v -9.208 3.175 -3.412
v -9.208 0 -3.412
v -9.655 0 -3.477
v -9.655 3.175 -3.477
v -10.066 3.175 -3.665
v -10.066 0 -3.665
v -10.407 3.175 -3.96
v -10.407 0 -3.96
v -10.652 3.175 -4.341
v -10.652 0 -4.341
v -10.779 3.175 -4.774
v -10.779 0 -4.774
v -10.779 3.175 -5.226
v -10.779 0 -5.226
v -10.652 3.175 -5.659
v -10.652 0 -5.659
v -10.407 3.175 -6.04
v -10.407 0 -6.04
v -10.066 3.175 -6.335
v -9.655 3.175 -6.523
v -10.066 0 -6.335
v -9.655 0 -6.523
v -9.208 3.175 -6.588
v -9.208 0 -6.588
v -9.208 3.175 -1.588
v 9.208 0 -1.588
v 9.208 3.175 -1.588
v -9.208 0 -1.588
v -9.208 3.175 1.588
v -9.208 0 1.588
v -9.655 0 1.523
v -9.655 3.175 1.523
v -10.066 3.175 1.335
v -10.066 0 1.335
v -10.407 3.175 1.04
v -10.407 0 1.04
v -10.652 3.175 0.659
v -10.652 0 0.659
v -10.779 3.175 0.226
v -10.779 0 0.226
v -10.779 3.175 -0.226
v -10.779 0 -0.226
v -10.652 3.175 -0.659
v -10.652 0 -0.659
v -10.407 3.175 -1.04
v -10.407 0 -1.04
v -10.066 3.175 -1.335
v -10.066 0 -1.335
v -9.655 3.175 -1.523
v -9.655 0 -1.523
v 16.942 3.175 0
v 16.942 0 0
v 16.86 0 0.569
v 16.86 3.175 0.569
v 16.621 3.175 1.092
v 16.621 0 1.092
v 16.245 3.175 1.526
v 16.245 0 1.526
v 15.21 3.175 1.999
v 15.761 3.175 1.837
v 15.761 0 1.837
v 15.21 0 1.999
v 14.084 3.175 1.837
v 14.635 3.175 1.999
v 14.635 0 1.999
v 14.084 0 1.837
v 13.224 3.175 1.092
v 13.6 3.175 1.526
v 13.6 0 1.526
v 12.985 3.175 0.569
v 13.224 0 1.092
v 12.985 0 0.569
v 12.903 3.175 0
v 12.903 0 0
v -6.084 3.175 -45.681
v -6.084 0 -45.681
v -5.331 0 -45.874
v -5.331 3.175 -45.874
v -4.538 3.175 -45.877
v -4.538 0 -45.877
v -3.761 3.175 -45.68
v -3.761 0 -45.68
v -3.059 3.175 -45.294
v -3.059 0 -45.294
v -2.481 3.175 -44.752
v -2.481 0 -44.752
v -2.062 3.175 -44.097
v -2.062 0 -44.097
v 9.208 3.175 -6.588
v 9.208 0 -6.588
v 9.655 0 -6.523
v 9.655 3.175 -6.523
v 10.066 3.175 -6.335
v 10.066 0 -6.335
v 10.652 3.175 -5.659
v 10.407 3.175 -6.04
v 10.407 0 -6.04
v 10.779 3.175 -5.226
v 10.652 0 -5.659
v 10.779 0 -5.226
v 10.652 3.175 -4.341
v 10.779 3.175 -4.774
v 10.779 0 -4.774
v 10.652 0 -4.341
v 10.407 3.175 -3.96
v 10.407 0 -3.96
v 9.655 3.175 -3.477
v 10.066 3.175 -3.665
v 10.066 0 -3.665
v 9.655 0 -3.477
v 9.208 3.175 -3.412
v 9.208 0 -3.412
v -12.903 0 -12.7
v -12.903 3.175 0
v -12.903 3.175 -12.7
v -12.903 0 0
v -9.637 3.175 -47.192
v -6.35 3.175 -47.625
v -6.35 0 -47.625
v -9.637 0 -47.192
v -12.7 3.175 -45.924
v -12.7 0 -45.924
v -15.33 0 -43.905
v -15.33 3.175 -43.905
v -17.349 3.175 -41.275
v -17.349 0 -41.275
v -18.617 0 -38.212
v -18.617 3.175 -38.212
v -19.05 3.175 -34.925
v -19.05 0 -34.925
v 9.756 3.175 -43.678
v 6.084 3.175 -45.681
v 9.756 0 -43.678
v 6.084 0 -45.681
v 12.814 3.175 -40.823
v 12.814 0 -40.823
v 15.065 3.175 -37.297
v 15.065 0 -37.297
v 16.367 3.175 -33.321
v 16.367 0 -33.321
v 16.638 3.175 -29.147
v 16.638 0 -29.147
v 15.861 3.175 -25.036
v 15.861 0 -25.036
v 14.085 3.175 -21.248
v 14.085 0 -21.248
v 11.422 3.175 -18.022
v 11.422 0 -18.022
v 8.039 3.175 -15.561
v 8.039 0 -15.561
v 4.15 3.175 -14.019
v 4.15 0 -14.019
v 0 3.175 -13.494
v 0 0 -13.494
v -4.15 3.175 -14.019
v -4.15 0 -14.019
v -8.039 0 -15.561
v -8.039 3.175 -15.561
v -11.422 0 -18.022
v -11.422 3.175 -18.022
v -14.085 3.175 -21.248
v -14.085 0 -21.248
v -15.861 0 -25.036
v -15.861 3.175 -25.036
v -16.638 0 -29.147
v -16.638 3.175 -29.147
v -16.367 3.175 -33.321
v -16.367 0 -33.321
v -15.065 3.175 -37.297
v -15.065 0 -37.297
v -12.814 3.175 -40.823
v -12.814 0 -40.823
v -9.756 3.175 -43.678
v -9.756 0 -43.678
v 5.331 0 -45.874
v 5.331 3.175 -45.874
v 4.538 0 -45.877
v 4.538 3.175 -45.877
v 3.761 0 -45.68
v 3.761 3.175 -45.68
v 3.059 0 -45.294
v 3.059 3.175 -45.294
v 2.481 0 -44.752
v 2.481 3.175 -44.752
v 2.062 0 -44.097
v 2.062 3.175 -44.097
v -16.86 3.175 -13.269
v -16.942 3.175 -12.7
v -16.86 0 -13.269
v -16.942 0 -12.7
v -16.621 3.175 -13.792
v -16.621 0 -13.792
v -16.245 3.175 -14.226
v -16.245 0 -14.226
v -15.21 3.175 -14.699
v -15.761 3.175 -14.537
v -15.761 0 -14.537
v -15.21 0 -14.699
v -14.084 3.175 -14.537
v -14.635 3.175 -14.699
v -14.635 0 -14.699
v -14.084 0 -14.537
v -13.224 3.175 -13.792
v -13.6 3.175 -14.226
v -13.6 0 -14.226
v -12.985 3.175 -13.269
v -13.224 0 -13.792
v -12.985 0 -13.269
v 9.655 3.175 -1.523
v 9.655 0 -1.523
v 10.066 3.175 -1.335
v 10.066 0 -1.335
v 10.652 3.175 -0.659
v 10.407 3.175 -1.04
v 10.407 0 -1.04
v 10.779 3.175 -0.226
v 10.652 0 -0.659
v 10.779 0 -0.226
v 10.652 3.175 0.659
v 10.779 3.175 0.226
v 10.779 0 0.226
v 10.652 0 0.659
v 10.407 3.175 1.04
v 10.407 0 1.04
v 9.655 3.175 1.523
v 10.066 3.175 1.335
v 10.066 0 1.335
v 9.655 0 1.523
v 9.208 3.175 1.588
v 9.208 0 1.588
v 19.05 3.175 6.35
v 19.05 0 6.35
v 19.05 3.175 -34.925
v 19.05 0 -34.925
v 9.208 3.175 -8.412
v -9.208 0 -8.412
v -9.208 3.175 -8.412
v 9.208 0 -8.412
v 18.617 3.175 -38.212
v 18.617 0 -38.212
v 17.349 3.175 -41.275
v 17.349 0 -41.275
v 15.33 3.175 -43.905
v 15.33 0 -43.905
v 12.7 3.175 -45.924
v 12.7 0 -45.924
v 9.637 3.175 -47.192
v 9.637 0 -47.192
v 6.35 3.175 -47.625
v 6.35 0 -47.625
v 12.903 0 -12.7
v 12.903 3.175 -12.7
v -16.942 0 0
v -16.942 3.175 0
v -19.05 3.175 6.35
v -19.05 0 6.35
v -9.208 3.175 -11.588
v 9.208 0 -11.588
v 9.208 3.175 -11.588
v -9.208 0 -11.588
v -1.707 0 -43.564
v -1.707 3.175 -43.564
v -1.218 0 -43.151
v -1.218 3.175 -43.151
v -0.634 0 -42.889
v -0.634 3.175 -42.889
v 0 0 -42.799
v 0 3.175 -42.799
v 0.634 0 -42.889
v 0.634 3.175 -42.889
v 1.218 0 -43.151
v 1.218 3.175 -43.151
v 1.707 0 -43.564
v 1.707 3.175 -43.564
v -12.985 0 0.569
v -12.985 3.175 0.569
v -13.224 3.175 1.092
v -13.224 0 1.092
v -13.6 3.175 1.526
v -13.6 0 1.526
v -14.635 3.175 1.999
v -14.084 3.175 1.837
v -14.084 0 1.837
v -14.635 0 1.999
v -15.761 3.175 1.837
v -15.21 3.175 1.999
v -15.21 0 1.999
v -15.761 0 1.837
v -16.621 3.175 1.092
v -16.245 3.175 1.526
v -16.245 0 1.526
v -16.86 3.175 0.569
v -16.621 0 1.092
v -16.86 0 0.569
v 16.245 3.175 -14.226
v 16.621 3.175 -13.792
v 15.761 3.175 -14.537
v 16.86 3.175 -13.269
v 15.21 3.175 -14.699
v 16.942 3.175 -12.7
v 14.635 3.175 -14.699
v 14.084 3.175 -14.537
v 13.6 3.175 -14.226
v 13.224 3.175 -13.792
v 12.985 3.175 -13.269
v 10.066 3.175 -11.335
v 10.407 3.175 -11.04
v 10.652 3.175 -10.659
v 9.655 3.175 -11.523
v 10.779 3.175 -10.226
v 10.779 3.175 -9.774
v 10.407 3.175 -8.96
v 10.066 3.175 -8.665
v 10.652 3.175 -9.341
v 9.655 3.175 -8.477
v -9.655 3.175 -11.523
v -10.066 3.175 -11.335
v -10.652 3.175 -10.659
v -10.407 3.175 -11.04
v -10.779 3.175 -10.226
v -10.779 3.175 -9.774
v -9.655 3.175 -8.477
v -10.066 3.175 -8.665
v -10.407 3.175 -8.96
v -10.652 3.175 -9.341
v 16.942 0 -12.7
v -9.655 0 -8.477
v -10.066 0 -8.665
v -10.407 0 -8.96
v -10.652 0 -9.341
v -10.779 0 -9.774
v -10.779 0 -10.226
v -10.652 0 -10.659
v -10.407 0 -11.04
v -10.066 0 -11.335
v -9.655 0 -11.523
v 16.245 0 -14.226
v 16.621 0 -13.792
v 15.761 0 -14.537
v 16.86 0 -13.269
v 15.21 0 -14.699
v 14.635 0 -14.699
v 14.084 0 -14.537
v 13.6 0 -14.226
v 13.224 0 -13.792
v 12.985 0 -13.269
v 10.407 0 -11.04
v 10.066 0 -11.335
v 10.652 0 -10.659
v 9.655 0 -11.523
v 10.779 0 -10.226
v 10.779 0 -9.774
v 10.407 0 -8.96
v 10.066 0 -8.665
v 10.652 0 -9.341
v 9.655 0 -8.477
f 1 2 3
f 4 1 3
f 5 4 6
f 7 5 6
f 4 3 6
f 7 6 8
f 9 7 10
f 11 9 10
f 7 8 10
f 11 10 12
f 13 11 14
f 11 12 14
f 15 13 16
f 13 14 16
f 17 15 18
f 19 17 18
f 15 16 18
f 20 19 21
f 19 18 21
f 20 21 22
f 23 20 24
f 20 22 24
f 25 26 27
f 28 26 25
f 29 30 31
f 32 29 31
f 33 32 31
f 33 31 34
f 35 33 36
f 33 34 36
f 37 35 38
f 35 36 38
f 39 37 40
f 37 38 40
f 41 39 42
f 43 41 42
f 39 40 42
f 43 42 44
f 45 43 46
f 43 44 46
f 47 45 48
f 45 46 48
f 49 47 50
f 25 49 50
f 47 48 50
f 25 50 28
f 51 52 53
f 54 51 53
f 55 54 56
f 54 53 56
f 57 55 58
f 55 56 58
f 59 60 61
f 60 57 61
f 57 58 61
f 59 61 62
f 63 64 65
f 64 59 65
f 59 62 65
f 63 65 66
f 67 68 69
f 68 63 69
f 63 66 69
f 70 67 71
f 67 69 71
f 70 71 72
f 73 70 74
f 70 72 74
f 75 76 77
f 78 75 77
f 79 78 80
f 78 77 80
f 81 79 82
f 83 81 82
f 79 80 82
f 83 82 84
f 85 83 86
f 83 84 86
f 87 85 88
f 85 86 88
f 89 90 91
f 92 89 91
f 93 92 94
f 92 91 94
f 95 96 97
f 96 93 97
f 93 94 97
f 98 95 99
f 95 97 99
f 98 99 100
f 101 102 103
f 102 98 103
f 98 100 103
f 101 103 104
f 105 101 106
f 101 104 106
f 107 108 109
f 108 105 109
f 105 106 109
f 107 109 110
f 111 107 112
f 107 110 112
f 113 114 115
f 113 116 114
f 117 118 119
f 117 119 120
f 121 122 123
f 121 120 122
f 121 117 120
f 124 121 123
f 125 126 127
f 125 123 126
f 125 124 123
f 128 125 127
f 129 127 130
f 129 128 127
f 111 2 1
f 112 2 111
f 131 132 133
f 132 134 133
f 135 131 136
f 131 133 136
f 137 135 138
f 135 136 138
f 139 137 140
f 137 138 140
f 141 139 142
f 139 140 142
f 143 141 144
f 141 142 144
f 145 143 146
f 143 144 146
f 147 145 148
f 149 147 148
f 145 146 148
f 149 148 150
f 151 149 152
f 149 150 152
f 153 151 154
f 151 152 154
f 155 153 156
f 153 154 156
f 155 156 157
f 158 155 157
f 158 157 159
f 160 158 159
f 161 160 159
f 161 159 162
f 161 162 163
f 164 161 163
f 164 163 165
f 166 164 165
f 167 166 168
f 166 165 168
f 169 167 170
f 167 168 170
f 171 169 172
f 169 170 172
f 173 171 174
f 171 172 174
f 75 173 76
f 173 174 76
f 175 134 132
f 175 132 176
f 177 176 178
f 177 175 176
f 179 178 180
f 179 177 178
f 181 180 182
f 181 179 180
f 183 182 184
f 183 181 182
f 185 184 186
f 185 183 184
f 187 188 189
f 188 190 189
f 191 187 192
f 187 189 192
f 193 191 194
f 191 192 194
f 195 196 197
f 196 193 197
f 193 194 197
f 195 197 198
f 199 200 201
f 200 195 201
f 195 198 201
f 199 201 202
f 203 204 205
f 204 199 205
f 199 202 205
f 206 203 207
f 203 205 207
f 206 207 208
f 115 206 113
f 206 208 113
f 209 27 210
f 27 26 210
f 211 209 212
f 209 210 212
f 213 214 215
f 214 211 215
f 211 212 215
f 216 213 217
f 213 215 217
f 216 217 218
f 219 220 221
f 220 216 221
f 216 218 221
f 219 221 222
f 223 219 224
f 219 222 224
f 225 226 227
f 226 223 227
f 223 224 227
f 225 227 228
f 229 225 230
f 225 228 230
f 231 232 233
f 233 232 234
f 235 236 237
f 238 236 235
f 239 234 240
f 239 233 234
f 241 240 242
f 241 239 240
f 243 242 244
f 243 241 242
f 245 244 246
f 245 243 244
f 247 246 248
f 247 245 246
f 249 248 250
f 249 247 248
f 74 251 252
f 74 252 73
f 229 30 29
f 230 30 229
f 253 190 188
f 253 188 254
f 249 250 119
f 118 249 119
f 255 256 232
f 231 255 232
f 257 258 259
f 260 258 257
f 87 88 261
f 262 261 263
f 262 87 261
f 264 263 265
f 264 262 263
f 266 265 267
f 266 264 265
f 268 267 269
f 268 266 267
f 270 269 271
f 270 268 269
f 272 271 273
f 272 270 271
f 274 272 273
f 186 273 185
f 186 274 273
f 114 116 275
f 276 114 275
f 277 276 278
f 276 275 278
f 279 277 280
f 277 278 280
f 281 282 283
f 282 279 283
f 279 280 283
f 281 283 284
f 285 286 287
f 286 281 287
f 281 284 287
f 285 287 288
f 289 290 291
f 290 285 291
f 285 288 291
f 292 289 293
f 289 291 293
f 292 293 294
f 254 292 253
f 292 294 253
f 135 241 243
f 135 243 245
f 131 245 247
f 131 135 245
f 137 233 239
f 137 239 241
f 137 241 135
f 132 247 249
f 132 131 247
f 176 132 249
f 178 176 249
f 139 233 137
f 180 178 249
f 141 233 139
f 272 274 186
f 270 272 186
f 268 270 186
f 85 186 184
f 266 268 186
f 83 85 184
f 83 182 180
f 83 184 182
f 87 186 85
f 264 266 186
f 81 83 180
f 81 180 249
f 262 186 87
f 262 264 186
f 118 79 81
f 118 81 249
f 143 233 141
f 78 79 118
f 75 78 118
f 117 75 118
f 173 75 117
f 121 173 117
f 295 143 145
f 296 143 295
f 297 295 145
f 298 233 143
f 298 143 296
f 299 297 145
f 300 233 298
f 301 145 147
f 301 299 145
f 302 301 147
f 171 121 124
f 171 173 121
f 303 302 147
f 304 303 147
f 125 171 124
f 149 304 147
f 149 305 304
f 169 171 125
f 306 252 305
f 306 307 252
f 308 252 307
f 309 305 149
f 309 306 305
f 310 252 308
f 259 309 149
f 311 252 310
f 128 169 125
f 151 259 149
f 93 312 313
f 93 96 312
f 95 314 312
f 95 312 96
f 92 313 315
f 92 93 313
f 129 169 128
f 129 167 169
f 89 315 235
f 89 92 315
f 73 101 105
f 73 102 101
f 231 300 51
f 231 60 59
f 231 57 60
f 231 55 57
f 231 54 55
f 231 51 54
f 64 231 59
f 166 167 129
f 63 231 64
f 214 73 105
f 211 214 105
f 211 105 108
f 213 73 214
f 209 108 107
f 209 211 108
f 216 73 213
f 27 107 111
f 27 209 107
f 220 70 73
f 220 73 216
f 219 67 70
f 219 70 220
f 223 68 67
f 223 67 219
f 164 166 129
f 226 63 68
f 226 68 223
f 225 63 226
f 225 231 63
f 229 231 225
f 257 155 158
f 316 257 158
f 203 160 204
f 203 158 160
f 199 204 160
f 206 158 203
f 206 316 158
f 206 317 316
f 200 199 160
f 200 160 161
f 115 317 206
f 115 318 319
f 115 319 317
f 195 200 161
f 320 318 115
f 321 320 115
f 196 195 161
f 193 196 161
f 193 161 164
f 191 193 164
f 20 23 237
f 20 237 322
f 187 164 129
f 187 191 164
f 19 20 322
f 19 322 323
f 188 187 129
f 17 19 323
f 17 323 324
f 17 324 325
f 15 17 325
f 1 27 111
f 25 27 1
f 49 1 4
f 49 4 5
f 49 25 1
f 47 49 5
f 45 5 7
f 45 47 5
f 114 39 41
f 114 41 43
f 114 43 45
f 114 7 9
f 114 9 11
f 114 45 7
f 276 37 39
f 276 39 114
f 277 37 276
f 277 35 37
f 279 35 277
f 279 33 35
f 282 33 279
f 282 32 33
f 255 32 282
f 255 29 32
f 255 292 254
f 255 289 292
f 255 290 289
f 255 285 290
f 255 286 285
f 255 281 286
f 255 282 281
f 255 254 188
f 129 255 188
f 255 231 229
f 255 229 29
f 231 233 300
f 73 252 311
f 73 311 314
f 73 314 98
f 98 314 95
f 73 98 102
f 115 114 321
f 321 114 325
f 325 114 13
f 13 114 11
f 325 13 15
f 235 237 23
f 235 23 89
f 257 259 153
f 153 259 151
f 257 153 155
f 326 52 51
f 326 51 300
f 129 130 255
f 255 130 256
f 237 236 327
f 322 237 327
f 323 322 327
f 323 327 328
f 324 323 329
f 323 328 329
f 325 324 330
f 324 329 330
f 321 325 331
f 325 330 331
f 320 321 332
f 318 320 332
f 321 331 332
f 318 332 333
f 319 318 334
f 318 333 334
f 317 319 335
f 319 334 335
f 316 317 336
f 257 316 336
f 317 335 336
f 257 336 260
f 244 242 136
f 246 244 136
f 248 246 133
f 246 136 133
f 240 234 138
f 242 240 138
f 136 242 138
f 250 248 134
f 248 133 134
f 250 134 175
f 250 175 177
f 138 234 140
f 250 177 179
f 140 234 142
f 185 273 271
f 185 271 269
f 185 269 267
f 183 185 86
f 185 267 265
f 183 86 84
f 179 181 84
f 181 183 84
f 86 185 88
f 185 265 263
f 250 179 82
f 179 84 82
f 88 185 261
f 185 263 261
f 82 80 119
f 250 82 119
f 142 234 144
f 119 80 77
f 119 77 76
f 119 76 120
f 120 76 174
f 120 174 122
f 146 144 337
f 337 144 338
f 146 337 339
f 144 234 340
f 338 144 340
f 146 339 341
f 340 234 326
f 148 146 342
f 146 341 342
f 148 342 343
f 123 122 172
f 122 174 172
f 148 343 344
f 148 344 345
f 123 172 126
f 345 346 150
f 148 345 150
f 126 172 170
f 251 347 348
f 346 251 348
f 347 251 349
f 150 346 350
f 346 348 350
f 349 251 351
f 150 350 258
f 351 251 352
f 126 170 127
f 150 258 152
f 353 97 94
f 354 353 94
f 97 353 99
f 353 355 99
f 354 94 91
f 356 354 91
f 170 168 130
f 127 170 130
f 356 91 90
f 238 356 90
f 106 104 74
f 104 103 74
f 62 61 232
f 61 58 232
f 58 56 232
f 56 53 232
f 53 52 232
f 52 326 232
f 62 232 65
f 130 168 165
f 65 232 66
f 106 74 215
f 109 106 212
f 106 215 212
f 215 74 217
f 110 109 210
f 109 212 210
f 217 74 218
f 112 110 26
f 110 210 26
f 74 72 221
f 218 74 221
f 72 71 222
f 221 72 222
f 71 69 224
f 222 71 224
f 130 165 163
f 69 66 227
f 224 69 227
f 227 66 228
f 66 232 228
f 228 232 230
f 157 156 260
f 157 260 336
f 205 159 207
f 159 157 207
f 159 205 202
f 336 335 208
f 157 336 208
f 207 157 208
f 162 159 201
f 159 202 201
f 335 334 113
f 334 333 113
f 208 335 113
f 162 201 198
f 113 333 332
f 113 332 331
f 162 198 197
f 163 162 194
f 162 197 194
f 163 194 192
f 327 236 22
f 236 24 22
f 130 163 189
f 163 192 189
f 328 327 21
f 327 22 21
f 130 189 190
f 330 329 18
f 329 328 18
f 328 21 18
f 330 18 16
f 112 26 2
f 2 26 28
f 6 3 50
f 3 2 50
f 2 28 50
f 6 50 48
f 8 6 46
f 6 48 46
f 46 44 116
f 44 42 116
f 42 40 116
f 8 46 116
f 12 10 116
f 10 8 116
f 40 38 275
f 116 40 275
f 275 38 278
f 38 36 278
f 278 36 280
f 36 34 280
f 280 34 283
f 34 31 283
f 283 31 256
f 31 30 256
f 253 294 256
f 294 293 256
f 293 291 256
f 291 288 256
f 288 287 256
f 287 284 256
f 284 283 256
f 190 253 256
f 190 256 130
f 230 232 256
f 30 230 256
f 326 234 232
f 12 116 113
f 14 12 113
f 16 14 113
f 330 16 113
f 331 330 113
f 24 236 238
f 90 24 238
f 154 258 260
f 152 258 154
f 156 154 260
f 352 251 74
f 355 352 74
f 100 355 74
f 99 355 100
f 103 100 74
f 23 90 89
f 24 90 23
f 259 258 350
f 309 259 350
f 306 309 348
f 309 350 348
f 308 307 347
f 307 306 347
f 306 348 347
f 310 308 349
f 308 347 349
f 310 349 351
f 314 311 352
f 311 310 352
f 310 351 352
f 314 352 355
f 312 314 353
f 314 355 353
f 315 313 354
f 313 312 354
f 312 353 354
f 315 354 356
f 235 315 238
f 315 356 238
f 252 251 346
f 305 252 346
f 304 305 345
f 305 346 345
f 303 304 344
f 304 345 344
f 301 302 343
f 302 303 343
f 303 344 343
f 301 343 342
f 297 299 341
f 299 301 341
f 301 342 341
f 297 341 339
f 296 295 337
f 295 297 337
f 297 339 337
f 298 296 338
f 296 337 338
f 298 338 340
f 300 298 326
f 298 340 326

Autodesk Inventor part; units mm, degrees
ref_plane "XZ Plane" through (0, 0, 0) normal (0, 1, 0) x (-1, 0, 0)
ref_plane "XY Plane" through (0, 0, 0) normal (0, 0, 1) x (1, 0, 0)
sketch "Sketch1" plane through (0, 0, 0) normal (0, 1, 0) x (-1, 0, 0)
  line L0 (-9.2075, -1.5875) -> (9.2075, -1.5875)
  line L1 (9.2075, -1.5875) -> (9.2075, 1.5875)
  line L2 (9.2075, 1.5875) -> (-9.2075, 1.5875)
  line L3 (-9.2075, 1.5875) -> (-9.2075, -1.5875)
  line L4 (-9.2075, -1.5875) -> (9.2075, 1.5875) construction
  line L5 (9.2075, -1.5875) -> (-9.2075, 1.5875) construction
  line L6 (-9.2075, -6.5875) -> (9.2075, -6.5875)
  line L7 (9.2075, -6.5875) -> (9.2075, -3.4125)
  line L8 (9.2075, -3.4125) -> (-9.2075, -3.4125)
  line L9 (-9.2075, -3.4125) -> (-9.2075, -6.5875)
  line L10 (-9.2075, -6.5875) -> (9.2075, -3.4125) construction
  line L11 (9.2075, -6.5875) -> (-9.2075, -3.4125) construction
  line L12 (-9.2075, -11.5875) -> (9.2075, -11.5875)
  line L13 (9.2075, -11.5875) -> (9.2075, -8.4125)
  line L14 (9.2075, -8.4125) -> (-9.2075, -8.4125)
  line L15 (-9.2075, -8.4125) -> (-9.2075, -11.5875)
  line L16 (-9.2075, -11.5875) -> (9.2075, -8.4125) construction
  line L17 (9.2075, -11.5875) -> (-9.2075, -8.4125) construction
  line L18 (19.05, 6.35) -> (-19.05, 6.35)
  line L19 (-19.05, 6.35) -> (-19.05, -47.625)
  line L20 (-19.05, -47.625) -> (19.05, -47.625)
  line L21 (19.05, -47.625) -> (19.05, 6.35)
  circle A0 centre (0, -30.1625) radius 16.6687
  circle A1 centre (9.2075, 0) radius 1.5875
  circle A2 centre (9.2075, -5) radius 1.5875
  circle A3 centre (9.2075, -10) radius 1.5875
  circle A4 centre (-9.2075, -10) radius 1.5875
  circle A5 centre (-9.2075, -5) radius 1.5875
  circle A6 centre (-9.2075, 0) radius 1.5875
  line L22 (14.9225, 0) -> (14.9225, -12.7) construction
  line L23 (12.9032, 0) -> (12.9032, -12.7)
  line L24 (16.9418, -12.7) -> (16.9418, 0)
  arc A7 (16.9418, 0) -> (12.9032, 0) centre (14.9225, 0) ccw
  arc A8 (12.9032, -12.7) -> (16.9418, -12.7) centre (14.9225, -12.7) ccw
  line L25 (-14.9225, 0) -> (-14.9225, -12.7) construction
  line L26 (-16.9418, 0) -> (-16.9418, -12.7)
  line L27 (-12.9032, -12.7) -> (-12.9032, 0)
  arc A9 (-12.9032, 0) -> (-16.9418, 0) centre (-14.9225, 0) ccw
  arc A10 (-16.9418, -12.7) -> (-12.9032, -12.7) centre (-14.9225, -12.7) ccw
  line L28 (10.795, 0) -> (19.05, 0) construction
  line L29 (-10.795, 0) -> (-19.05, 0) construction
  point P0 (0, 0)
  point P1 (0, -5)
  point P2 (0, -10)
  point P3 (0, 6.35)
  point P4 (-9.2075, -11.5875)
  point P5 (9.2075, -8.4125)
  point P6 (-9.2075, -1.5875)
  point P7 (9.2075, 1.5875)
  point P8 (-9.2075, -6.5875)
  point P9 (9.2075, -3.4125)
  point P10 (14.9225, -6.35)
  point P11 (-14.9225, -6.35)
  point P12 (14.9225, 0)
  point P13 (-14.9225, 0)
  dimension "d0" = 18.415
  dimension "d1" = 3.175
  dimension "d6" = 5
  dimension "d7" = 5
  dimension "d8" = 38.1
  dimension "d9" = 53.975
  dimension "d10" = 6.35
  dimension "d11" = 33.3375
  dimension "d20" = 17.4625
  dimension "d21" = 4.0386
  dimension "d22" = 4.0386
  dimension "d23" = 12.7
  dimension "d26" = 12.7
extrude "Extrusion1" add sketch "Sketch1" along normal blind 3.175
sketch "Sketch2" plane through (0, 3.175, 0) normal (0, 1, 0) x (1, 0, 0)
  circle A0 centre (0, 45.085) radius 2.286
  line L0 (19.05, 47.625) -> (-19.05, 47.625) projected
  point P0 (0, 0)
  point P1 (0, 47.625)
  dimension "d14" = 4.572
  dimension "d15" = 2.54
extrude "Extrusion2" add sketch "Sketch2" against normal blind 3.175
fillet "Fillet1" radius 3.175 2 edges at (-1.5575, 1.5875, -46.7583) (1.5575, 1.5875, -46.7583)
fillet "Fillet2" radius 12.7 2 edges at (-19.05, 1.5875, -47.625) (19.05, 1.5875, -47.625)
equation "\"d21\" = d22"
properties part number "EL2-018" material "Aluminum 6061"
